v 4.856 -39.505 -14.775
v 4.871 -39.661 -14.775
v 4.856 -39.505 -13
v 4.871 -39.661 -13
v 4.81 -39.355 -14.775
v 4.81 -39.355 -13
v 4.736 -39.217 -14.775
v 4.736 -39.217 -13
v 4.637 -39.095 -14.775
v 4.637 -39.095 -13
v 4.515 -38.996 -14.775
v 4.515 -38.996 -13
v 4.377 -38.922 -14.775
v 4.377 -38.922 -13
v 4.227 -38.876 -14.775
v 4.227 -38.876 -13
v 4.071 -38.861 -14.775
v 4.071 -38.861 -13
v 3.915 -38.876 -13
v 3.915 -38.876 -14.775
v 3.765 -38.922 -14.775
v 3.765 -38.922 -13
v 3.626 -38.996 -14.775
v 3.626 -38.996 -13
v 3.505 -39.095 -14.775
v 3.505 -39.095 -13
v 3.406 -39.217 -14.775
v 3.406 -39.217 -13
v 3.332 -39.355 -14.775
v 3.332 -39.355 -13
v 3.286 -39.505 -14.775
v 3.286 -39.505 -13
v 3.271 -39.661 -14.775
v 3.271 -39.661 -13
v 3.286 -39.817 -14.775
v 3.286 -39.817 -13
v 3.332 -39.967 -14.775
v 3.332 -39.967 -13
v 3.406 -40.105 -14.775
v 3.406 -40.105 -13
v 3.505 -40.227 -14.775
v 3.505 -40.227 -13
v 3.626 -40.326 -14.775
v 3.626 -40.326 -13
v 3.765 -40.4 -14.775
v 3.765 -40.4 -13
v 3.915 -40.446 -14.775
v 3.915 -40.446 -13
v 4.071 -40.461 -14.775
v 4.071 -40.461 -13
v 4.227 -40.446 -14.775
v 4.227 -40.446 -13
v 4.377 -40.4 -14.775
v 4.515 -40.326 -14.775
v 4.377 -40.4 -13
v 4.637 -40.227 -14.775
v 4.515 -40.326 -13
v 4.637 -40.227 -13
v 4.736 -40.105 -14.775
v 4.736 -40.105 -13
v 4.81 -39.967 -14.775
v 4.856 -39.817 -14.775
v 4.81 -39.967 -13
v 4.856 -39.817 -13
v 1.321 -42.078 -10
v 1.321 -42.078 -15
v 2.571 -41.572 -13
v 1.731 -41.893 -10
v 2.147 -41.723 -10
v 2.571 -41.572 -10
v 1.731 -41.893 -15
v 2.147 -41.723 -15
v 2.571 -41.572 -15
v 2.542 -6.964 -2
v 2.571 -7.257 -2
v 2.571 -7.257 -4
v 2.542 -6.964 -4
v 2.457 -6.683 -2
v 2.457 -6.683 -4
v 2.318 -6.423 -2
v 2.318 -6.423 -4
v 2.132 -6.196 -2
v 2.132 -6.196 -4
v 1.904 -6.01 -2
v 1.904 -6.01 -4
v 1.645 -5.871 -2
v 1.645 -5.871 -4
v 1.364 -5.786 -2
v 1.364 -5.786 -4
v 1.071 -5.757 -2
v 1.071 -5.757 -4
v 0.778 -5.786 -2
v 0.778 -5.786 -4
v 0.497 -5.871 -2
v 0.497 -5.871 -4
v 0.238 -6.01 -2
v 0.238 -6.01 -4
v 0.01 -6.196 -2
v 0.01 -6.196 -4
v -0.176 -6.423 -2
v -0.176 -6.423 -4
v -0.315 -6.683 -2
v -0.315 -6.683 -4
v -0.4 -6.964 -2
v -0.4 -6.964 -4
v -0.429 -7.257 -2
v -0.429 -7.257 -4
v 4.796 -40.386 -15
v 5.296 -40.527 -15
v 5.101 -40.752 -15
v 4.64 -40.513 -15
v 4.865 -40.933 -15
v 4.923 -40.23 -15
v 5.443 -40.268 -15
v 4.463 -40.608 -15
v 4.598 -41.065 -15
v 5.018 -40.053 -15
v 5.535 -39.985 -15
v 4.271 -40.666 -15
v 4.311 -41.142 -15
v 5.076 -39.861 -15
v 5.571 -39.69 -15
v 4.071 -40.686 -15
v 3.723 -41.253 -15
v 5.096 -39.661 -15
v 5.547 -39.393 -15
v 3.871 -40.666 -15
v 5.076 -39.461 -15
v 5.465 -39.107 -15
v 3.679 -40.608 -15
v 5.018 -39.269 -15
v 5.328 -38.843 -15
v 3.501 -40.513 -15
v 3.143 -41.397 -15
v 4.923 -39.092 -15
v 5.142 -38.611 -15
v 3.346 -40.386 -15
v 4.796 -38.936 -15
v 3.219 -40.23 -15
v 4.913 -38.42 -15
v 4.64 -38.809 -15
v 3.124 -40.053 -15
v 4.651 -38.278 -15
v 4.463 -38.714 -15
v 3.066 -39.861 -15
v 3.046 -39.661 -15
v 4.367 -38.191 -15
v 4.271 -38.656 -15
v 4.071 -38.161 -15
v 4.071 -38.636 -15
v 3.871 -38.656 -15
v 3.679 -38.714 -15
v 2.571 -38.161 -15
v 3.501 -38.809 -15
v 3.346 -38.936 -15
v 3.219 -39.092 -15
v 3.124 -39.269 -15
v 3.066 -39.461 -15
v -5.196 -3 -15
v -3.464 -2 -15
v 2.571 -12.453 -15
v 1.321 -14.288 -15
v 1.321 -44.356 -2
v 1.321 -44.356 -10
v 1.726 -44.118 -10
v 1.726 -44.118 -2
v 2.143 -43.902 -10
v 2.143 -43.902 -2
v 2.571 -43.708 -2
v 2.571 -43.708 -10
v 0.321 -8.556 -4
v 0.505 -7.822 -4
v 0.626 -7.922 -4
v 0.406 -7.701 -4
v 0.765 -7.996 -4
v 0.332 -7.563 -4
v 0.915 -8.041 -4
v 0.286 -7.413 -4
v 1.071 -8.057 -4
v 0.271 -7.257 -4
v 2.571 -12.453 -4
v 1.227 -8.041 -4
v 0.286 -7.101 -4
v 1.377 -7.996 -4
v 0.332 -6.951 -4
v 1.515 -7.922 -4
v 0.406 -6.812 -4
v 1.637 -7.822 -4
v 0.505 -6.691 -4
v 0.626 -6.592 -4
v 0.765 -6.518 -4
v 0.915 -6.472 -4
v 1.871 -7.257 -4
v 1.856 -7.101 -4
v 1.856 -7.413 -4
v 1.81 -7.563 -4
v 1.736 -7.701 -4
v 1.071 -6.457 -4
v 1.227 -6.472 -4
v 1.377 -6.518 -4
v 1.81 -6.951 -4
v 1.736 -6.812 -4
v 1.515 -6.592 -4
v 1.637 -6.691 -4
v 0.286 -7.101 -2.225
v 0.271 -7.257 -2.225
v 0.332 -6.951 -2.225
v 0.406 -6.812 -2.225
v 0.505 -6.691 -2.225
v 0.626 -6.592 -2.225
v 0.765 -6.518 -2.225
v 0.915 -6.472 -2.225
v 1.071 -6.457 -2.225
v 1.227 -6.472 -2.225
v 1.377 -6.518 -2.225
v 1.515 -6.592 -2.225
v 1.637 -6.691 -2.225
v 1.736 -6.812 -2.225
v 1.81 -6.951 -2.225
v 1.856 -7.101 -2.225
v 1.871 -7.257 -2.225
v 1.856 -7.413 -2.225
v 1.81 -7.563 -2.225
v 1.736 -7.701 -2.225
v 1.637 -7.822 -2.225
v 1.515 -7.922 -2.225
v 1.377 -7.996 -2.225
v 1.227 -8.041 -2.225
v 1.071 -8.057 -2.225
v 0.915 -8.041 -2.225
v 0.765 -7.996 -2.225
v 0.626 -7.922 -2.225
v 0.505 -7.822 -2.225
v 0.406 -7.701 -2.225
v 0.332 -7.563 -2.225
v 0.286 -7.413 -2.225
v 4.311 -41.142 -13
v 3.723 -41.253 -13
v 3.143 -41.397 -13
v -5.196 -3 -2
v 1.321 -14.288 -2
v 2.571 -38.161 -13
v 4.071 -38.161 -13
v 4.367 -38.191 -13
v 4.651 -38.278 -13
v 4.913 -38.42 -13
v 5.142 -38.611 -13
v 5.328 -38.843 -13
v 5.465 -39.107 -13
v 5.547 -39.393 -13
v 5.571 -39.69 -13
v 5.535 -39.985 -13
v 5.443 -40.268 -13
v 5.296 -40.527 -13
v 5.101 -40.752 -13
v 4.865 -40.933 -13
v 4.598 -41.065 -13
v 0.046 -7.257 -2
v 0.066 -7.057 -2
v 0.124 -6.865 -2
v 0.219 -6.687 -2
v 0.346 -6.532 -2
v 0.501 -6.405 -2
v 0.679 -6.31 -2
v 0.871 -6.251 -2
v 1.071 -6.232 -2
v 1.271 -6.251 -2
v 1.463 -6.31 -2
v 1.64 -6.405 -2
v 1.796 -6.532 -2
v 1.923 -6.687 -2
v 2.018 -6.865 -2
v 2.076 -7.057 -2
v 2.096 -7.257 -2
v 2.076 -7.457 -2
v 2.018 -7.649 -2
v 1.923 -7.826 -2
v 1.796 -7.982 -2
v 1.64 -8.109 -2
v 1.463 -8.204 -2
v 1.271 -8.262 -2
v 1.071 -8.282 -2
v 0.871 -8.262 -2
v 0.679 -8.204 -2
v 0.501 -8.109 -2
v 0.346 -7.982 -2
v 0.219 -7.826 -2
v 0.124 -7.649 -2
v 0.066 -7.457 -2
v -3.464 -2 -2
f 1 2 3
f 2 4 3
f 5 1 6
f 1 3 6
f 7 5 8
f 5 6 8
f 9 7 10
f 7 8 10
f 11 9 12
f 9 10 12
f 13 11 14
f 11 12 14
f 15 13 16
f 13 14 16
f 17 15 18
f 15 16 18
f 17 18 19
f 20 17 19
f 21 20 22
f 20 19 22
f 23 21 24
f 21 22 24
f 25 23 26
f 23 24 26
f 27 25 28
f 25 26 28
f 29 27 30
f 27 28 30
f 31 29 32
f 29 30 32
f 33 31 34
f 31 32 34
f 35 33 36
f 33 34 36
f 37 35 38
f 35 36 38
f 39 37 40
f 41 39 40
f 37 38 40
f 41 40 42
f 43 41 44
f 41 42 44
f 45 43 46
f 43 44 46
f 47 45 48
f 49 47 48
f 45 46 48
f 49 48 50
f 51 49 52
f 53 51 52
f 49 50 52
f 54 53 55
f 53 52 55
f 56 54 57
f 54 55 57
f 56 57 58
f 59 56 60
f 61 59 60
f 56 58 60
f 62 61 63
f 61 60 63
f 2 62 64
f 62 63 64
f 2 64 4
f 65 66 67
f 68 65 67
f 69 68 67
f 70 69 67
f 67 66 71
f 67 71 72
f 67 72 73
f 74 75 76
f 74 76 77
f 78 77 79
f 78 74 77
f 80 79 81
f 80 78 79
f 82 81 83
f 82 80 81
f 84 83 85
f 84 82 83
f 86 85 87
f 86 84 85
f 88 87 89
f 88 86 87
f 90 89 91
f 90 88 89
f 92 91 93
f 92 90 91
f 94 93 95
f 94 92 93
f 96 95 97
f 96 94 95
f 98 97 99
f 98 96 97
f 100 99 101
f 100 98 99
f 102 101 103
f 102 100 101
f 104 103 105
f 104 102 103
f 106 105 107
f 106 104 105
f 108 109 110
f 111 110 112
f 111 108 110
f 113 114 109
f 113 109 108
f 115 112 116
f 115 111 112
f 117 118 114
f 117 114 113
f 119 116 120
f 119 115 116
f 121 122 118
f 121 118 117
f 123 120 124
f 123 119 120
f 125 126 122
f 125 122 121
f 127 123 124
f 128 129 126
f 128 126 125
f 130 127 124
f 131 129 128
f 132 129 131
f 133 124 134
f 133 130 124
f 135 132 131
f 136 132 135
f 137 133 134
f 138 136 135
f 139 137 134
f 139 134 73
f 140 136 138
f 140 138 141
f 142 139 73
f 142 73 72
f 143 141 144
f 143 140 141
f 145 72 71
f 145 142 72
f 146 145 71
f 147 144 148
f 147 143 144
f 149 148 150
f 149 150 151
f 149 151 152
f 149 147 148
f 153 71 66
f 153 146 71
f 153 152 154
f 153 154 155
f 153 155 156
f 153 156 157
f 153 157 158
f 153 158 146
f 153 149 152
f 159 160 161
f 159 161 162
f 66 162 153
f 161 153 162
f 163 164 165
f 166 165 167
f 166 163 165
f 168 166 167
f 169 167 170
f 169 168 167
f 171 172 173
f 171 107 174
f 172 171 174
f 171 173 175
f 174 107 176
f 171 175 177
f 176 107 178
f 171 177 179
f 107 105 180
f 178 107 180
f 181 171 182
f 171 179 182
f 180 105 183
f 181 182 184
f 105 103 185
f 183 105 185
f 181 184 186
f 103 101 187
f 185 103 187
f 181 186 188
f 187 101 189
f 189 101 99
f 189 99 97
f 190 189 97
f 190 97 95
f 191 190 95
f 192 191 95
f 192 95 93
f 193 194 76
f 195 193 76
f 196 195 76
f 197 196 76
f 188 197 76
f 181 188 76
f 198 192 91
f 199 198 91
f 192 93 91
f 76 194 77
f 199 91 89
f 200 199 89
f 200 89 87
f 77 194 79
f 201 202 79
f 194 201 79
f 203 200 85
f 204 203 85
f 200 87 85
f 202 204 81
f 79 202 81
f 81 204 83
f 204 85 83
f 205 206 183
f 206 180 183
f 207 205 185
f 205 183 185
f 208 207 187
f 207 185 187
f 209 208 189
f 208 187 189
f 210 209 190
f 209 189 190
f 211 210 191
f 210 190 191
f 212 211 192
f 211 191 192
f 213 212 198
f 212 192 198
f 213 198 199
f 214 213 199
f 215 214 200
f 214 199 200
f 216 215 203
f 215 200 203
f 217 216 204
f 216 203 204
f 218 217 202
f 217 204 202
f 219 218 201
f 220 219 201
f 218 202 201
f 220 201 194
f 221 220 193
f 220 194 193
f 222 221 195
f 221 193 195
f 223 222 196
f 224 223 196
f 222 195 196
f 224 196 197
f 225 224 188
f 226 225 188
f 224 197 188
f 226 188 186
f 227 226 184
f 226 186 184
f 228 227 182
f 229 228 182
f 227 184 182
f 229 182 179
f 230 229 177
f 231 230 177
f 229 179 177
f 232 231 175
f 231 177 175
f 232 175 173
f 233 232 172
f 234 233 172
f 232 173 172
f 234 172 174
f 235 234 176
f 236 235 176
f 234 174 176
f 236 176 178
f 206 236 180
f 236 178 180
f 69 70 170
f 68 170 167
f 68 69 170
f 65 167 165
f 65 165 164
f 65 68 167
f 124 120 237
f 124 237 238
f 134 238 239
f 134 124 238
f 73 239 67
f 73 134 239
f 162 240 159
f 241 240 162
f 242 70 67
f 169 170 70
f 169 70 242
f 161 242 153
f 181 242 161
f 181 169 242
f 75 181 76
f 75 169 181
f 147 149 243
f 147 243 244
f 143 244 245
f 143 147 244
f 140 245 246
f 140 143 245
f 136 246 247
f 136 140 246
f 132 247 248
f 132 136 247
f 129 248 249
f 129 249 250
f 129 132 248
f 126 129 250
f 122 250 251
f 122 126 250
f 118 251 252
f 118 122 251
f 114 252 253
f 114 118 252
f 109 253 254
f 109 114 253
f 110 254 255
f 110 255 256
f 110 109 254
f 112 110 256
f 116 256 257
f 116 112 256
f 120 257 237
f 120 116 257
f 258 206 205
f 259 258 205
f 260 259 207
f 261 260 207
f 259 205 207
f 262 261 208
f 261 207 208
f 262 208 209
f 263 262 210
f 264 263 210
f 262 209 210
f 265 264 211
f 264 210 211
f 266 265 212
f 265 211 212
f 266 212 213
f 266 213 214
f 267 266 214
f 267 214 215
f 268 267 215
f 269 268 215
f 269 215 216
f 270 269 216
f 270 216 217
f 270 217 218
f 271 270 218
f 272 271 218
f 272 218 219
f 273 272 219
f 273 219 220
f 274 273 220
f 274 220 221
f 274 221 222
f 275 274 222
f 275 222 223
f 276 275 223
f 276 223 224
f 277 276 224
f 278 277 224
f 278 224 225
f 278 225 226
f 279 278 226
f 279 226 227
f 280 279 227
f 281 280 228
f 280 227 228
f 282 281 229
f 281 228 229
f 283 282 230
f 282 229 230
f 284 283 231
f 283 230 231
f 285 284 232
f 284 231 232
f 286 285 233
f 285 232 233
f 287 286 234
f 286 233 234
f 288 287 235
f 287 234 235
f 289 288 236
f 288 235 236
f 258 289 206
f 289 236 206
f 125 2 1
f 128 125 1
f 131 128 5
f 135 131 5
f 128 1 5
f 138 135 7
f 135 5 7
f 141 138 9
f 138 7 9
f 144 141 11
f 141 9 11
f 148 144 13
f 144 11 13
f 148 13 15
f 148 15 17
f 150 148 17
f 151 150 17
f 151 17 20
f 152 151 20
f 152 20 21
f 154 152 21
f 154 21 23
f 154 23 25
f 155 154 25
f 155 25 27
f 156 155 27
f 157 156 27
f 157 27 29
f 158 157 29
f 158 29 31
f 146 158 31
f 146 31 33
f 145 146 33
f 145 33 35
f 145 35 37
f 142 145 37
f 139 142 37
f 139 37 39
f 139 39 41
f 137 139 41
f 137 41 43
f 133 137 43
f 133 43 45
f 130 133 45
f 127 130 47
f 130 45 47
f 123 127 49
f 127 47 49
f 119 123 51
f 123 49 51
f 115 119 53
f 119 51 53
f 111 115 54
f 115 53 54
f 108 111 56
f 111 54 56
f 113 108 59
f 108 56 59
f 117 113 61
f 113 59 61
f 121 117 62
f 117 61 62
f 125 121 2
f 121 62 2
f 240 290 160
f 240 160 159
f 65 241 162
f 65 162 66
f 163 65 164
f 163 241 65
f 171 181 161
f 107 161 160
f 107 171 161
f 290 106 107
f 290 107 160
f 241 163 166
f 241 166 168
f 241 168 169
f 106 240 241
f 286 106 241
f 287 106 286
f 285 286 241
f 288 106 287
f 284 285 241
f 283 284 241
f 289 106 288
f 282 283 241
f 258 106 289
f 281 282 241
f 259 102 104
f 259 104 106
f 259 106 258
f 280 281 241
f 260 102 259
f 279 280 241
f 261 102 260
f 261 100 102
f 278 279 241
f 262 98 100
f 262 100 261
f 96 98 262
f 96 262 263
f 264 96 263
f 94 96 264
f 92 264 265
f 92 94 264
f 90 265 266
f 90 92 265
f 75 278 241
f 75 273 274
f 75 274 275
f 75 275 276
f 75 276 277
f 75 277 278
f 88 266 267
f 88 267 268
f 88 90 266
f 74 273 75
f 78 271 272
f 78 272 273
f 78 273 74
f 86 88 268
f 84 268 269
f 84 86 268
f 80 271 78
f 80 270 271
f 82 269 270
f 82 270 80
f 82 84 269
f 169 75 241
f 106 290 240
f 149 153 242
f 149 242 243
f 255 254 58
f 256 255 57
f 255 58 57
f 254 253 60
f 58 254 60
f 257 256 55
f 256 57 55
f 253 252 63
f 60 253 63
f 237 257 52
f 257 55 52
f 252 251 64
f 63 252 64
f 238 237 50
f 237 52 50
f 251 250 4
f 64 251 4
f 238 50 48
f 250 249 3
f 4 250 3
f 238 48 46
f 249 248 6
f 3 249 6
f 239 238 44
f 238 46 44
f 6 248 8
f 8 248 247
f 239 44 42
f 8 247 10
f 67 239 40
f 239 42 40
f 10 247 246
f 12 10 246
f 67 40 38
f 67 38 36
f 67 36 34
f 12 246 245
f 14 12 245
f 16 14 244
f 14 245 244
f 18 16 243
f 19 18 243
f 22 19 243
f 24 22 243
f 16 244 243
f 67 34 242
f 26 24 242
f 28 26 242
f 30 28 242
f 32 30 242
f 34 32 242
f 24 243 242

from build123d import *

# Parameters (mm, degrees)
EXTRUDE_START                = -2
EXTRUDE_1_DEPTH              = 13
SKETCH_2_R                   = 11
CUT_EXTRUDE_1_DEPTH          = 5
SKETCH_3_R                   = 1.5
EXTRUDE_2_DEPTH              = 2
EXTRUDE_3_DEPTH              = 2
HOLE_WIZARD_M2_4_D           = 1.6
HOLE_WIZARD_M2_4_DEPTH       = 5.2
HOLE_WIZARD_M2_4_CSINK_D     = 2.05
HOLE_WIZARD_M2_4_CSINK_ANGLE = 90
HOLE_WIZARD_M2_4_TIP         = 0.480688495
HOLE_WIZARD_M2_5_D           = 1.6
HOLE_WIZARD_M2_5_DEPTH       = 5.2
HOLE_WIZARD_M2_5_CSINK_D     = 2.05
HOLE_WIZARD_M2_5_CSINK_ANGLE = 90
HOLE_WIZARD_M2_5_TIP         = 0.480688495


with BuildPart() as part:
    # 草图1 → 凸台-拉伸1 (new body)
    with BuildSketch(Plane.XY.offset(EXTRUDE_START)):
        with BuildLine():
            Line((2.570888862, -12.45291013), (-3.464101615, -2))
            Line((-3.464101615, -2), (-5.196152423, -3))
            Line((-5.196152423, -3), (1.320888862, -14.287846621))
            Line((1.320888862, -14.287846621), (1.320888862, -44.355557574))
            ThreePointArc((1.320888862, -44.355557574), (1.933218512, -44.007523283), (2.570888862, -43.708438024))
            Line((2.570888862, -43.708438024), (2.570888862, -12.45291013))
        make_face()
    extrude(amount=-EXTRUDE_1_DEPTH)

    # 草图2 → 切除-拉伸1 (cut)
    with BuildSketch(Plane(origin=(0, 0, -15), x_dir=(-1, 0, 0), z_dir=(0, 0, -1))):
        with Locations((-6.070888862, -52)):
            Circle(SKETCH_2_R)
    extrude(amount=-CUT_EXTRUDE_1_DEPTH, mode=Mode.SUBTRACT)

    # 草图3 → 凸台-拉伸2 (add)
    with BuildSketch(Plane(origin=(0, 0, -15), x_dir=(-1, 0, 0), z_dir=(0, 0, -1))):
        with Locations((-4.070888862, -39.661037321)):
            Circle(SKETCH_3_R)
        with BuildLine():
            Line((-2.570888862, -41.571673193), (-2.570888862, -39.661037321))
            ThreePointArc((-2.570888862, -39.661037321), (-3.098777733, -40.803403266), (-4.310888798, -41.141712853))
            ThreePointArc((-4.310888798, -41.141712853), (-3.432117057, -41.321194666), (-2.570888862, -41.571673193))
        make_face()
        with BuildLine():
            Line((-2.570888862, -39.661037321), (-2.570888862, -38.161037321))
            Line((-2.570888862, -38.161037321), (-4.070888862, -38.161037321))
            ThreePointArc((-4.070888862, -38.161037321), (-3.010228691, -38.600377149), (-2.570888862, -39.661037321))
        make_face()
    extrude(amount=-EXTRUDE_2_DEPTH)

    # 草图4 → 凸台-拉伸3 (add)
    with BuildSketch(Plane.XY.offset(-2)):
        with BuildLine():
            Line((0.320888862, -8.555795813), (2.570888862, -12.45291013))
            Line((2.570888862, -12.45291013), (2.570888862, -7.256757708))
            ThreePointArc((2.570888862, -7.256757708), (1.820888862, -8.555795813), (0.320888862, -8.555795813))
        make_face()
        with BuildLine():
            ThreePointArc((0.320888862, -8.555795813), (1.820888862, -8.555795813), (2.570888862, -7.256757708))
            Line((2.570888862, -7.256757708), (-0.429111138, -7.256757708))
            Line((-0.429111138, -7.256757708), (0.320888862, -8.555795813))
        make_face()
        with BuildLine():
            Line((-0.429111138, -7.256757708), (2.570888862, -7.256757708))
            ThreePointArc((2.570888862, -7.256757708), (1.070888862, -5.756757708), (-0.429111138, -7.256757708))
        make_face()
    extrude(amount=-EXTRUDE_3_DEPTH)

    # M2 螺纹孔4
    with Locations(Plane.XY.offset(-2)):
        with Locations((1.070888862, -7.256757708)):
            CounterSinkHole(HOLE_WIZARD_M2_4_D / 2, HOLE_WIZARD_M2_4_CSINK_D / 2, depth=HOLE_WIZARD_M2_4_DEPTH, counter_sink_angle=HOLE_WIZARD_M2_4_CSINK_ANGLE)
            with Locations((0, 0, -(HOLE_WIZARD_M2_4_DEPTH + HOLE_WIZARD_M2_4_TIP / 2))):  # 118° drill point
                Cone(0, HOLE_WIZARD_M2_4_D / 2, HOLE_WIZARD_M2_4_TIP, mode=Mode.SUBTRACT)

    # M2 螺纹孔5
    with Locations(Plane(origin=(0, 0, -15), x_dir=(-1, 0, 0), z_dir=(0, 0, -1))):
        with Locations((-4.070888862, -39.661037321)):
            CounterSinkHole(HOLE_WIZARD_M2_5_D / 2, HOLE_WIZARD_M2_5_CSINK_D / 2, depth=HOLE_WIZARD_M2_5_DEPTH, counter_sink_angle=HOLE_WIZARD_M2_5_CSINK_ANGLE)
            with Locations((0, 0, -(HOLE_WIZARD_M2_5_DEPTH + HOLE_WIZARD_M2_5_TIP / 2))):  # 118° drill point
                Cone(0, HOLE_WIZARD_M2_5_D / 2, HOLE_WIZARD_M2_5_TIP, mode=Mode.SUBTRACT)


solid = part.part
